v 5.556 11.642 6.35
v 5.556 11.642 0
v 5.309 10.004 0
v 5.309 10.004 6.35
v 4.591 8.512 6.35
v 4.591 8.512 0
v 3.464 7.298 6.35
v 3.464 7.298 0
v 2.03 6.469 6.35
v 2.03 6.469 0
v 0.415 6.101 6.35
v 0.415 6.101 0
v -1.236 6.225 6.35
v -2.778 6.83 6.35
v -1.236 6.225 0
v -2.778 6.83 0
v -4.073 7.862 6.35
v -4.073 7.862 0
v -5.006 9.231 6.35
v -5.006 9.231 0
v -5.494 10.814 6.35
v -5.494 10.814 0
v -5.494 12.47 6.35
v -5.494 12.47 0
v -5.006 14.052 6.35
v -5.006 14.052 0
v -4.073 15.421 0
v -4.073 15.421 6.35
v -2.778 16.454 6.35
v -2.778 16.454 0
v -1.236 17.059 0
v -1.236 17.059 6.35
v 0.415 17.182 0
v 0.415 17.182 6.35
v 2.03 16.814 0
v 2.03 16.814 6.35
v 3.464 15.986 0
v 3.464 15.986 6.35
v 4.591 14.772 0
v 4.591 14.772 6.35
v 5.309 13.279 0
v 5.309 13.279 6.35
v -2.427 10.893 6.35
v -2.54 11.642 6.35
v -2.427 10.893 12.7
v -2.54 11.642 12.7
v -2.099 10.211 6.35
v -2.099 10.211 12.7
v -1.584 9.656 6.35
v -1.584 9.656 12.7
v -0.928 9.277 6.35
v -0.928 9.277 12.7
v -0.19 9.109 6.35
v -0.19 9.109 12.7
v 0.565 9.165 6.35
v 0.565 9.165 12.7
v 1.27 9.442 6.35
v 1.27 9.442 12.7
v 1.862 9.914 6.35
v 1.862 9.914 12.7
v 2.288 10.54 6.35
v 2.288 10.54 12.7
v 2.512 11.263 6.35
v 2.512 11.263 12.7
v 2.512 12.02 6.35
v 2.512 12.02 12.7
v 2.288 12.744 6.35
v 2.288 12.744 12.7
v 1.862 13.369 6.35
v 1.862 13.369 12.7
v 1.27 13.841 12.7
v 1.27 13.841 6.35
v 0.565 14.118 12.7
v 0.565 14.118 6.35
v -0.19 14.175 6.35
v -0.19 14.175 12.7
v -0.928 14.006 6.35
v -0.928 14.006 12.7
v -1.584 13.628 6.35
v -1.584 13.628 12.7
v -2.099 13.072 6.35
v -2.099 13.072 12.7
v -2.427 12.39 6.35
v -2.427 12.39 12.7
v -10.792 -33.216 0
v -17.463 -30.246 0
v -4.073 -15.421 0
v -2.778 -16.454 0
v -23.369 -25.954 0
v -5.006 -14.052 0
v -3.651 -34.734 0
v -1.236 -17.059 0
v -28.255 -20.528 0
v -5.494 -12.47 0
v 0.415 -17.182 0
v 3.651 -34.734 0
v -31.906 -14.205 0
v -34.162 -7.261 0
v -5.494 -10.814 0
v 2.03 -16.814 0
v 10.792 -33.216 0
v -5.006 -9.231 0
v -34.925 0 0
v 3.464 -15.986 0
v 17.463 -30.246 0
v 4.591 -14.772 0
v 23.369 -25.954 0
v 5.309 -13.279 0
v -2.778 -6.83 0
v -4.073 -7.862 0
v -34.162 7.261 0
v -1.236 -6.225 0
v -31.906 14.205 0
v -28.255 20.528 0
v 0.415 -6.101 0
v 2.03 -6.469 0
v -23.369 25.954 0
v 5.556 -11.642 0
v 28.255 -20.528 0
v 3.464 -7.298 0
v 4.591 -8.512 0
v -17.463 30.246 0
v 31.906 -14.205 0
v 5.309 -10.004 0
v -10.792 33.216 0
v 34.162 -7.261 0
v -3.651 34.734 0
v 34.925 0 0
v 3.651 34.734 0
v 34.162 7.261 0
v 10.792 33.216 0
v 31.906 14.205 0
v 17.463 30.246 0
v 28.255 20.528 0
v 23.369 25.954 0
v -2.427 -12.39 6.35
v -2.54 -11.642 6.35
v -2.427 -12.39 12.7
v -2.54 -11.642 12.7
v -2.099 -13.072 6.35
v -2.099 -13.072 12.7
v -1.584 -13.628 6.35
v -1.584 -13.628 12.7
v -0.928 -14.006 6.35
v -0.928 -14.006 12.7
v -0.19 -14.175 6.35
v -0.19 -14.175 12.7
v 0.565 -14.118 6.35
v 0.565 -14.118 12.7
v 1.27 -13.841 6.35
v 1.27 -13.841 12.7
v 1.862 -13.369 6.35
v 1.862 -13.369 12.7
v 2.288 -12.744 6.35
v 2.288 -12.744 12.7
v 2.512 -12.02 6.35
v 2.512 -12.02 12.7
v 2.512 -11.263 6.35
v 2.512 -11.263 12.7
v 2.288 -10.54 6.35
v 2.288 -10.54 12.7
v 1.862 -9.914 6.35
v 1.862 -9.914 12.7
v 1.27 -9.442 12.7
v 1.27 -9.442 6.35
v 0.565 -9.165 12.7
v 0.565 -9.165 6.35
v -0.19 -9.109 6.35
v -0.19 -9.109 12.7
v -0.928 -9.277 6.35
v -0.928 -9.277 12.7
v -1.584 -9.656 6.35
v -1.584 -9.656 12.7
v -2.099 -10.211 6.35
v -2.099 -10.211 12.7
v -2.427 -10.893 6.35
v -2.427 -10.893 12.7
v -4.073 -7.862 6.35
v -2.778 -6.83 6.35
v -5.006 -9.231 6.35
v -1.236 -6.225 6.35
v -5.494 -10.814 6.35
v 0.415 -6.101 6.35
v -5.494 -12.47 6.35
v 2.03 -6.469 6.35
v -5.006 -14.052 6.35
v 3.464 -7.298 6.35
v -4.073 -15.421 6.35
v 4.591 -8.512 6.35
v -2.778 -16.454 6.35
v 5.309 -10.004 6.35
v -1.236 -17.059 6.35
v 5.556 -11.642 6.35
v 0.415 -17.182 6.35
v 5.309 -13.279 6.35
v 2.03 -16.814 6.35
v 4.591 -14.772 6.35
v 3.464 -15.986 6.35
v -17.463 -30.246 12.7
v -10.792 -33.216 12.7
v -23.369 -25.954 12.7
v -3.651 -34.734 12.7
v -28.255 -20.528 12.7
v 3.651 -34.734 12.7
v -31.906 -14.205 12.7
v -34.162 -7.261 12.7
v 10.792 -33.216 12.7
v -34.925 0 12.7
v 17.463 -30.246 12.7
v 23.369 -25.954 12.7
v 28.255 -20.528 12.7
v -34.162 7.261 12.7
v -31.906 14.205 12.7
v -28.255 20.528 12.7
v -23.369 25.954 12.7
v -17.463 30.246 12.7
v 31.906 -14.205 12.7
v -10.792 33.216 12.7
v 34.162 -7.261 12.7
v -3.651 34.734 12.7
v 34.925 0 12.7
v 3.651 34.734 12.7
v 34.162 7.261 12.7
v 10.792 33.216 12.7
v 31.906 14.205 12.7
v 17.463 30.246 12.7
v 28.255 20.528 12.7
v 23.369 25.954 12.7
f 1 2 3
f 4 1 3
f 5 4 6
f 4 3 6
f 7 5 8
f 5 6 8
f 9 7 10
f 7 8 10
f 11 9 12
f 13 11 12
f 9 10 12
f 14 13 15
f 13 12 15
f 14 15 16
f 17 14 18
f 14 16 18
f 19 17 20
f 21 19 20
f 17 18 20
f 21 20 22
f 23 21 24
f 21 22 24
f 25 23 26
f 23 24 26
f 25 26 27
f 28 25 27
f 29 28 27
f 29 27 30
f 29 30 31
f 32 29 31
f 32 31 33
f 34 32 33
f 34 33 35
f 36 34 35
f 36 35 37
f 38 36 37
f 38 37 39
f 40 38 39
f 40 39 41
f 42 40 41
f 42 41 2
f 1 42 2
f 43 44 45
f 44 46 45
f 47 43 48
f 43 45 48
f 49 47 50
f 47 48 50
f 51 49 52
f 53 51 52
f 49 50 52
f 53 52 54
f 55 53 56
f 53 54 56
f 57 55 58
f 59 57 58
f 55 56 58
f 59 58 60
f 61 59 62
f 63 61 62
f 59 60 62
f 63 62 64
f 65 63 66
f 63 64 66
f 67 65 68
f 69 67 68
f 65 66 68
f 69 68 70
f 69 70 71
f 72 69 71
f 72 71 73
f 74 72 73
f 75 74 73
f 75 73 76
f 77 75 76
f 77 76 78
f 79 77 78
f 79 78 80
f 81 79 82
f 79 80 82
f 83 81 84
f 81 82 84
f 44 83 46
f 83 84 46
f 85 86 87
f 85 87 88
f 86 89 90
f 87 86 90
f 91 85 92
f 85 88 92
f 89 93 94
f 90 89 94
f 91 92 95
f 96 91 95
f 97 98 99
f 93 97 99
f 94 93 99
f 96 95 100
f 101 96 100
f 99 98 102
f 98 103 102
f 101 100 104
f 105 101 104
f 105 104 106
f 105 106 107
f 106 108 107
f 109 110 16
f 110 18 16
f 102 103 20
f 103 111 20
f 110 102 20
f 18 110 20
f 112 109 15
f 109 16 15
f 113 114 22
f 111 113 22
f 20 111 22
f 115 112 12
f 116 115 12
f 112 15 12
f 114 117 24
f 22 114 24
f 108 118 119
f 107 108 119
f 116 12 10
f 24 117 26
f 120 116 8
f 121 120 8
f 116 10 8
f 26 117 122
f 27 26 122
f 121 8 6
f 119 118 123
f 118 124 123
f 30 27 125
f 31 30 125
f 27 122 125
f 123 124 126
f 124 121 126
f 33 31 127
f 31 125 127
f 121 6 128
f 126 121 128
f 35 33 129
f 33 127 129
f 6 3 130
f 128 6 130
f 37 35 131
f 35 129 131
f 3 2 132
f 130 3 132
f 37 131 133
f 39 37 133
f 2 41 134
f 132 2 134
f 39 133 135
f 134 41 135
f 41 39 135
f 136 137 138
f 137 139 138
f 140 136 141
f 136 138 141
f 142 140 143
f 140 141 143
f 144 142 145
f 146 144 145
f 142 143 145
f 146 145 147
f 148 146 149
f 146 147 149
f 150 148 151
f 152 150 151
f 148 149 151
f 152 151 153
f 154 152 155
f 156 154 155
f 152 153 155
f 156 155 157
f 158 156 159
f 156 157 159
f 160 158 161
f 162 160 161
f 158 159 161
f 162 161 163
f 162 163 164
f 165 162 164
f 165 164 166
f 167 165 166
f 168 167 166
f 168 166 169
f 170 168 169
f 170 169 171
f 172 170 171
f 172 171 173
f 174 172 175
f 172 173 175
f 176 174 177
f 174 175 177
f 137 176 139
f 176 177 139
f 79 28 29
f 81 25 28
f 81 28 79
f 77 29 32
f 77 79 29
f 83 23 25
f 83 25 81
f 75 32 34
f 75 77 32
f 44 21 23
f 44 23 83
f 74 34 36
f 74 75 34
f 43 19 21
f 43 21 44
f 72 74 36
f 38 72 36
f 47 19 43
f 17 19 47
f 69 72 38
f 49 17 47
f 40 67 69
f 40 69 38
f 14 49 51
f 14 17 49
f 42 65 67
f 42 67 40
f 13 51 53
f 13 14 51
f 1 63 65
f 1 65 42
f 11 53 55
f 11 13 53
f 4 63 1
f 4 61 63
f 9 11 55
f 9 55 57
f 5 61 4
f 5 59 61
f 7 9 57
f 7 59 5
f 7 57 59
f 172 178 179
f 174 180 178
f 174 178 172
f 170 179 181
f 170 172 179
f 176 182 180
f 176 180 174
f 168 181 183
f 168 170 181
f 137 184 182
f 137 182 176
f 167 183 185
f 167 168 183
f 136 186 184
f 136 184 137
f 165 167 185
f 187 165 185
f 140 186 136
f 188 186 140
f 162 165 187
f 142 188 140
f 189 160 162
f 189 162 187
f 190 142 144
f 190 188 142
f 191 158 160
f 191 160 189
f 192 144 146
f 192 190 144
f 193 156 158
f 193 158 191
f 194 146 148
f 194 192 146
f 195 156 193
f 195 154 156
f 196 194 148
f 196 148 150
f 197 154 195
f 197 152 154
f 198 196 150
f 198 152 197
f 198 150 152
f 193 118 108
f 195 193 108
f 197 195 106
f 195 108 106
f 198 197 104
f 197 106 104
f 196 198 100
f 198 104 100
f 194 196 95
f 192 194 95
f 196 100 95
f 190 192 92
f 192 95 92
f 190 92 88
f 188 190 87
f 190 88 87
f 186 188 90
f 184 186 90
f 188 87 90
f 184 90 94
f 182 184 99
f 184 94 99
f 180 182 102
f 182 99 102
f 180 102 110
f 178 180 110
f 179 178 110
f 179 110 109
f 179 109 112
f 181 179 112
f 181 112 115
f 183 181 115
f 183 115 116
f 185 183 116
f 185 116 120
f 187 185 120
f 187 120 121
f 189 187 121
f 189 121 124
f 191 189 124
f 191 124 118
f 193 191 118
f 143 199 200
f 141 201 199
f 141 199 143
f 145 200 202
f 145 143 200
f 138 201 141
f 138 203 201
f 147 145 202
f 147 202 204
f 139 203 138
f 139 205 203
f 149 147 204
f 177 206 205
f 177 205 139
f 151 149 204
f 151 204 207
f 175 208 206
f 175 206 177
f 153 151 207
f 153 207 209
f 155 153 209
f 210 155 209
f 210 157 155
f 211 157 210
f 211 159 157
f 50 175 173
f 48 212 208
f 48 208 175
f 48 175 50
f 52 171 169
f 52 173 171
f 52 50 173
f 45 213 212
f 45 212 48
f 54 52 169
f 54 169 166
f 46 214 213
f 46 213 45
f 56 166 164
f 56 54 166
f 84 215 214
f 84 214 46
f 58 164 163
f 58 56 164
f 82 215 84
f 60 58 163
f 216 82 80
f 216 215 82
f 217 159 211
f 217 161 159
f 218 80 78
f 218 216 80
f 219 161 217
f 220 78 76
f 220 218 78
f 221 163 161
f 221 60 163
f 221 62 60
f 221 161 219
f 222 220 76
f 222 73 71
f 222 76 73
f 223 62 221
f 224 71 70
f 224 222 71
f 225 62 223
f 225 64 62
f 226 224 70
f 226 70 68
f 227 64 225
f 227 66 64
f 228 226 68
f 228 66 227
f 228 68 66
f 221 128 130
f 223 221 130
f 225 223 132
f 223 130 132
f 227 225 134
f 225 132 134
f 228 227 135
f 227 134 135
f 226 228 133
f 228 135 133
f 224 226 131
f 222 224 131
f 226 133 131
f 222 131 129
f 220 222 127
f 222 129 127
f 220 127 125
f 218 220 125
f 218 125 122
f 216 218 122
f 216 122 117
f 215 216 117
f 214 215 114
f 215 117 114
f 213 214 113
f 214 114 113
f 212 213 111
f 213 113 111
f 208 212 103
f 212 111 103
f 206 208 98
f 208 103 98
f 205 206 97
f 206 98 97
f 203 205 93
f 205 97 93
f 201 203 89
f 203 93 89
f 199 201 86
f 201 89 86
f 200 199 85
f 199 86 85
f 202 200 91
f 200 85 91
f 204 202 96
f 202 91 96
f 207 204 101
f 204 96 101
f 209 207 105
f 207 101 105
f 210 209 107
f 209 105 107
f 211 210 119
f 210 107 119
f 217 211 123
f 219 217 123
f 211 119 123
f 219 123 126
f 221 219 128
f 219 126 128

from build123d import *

# Parameters (mm, degrees)
SKETCH1_R                                           = 34.925
BOSS_EXTRUDE1_DEPTH                                 = 12.7
CBORE_FOR_10_BINDING_HEAD_MACHINE_SCREW_D           = 5.08
CBORE_FOR_10_BINDING_HEAD_MACHINE_SCREW_CBORE_D     = 11.1125
CBORE_FOR_10_BINDING_HEAD_MACHINE_SCREW_CBORE_DEPTH = 6.35


with BuildPart() as part:
    # Sketch1 → Boss-Extrude1 (new body)
    with BuildSketch(Plane.XY):
        Circle(SKETCH1_R)
    extrude(amount=BOSS_EXTRUDE1_DEPTH)

    # CBORE for #10 Binding Head Machine Screw1 (through all)
    with Locations(Plane(origin=(0, 0, 0), x_dir=(1, 0, 0), z_dir=(0, 0, -1))):
        with Locations((0, -11.641666667), (0, 11.641666667)):
            CounterBoreHole(CBORE_FOR_10_BINDING_HEAD_MACHINE_SCREW_D / 2, CBORE_FOR_10_BINDING_HEAD_MACHINE_SCREW_CBORE_D / 2, CBORE_FOR_10_BINDING_HEAD_MACHINE_SCREW_CBORE_DEPTH)


solid = part.part
